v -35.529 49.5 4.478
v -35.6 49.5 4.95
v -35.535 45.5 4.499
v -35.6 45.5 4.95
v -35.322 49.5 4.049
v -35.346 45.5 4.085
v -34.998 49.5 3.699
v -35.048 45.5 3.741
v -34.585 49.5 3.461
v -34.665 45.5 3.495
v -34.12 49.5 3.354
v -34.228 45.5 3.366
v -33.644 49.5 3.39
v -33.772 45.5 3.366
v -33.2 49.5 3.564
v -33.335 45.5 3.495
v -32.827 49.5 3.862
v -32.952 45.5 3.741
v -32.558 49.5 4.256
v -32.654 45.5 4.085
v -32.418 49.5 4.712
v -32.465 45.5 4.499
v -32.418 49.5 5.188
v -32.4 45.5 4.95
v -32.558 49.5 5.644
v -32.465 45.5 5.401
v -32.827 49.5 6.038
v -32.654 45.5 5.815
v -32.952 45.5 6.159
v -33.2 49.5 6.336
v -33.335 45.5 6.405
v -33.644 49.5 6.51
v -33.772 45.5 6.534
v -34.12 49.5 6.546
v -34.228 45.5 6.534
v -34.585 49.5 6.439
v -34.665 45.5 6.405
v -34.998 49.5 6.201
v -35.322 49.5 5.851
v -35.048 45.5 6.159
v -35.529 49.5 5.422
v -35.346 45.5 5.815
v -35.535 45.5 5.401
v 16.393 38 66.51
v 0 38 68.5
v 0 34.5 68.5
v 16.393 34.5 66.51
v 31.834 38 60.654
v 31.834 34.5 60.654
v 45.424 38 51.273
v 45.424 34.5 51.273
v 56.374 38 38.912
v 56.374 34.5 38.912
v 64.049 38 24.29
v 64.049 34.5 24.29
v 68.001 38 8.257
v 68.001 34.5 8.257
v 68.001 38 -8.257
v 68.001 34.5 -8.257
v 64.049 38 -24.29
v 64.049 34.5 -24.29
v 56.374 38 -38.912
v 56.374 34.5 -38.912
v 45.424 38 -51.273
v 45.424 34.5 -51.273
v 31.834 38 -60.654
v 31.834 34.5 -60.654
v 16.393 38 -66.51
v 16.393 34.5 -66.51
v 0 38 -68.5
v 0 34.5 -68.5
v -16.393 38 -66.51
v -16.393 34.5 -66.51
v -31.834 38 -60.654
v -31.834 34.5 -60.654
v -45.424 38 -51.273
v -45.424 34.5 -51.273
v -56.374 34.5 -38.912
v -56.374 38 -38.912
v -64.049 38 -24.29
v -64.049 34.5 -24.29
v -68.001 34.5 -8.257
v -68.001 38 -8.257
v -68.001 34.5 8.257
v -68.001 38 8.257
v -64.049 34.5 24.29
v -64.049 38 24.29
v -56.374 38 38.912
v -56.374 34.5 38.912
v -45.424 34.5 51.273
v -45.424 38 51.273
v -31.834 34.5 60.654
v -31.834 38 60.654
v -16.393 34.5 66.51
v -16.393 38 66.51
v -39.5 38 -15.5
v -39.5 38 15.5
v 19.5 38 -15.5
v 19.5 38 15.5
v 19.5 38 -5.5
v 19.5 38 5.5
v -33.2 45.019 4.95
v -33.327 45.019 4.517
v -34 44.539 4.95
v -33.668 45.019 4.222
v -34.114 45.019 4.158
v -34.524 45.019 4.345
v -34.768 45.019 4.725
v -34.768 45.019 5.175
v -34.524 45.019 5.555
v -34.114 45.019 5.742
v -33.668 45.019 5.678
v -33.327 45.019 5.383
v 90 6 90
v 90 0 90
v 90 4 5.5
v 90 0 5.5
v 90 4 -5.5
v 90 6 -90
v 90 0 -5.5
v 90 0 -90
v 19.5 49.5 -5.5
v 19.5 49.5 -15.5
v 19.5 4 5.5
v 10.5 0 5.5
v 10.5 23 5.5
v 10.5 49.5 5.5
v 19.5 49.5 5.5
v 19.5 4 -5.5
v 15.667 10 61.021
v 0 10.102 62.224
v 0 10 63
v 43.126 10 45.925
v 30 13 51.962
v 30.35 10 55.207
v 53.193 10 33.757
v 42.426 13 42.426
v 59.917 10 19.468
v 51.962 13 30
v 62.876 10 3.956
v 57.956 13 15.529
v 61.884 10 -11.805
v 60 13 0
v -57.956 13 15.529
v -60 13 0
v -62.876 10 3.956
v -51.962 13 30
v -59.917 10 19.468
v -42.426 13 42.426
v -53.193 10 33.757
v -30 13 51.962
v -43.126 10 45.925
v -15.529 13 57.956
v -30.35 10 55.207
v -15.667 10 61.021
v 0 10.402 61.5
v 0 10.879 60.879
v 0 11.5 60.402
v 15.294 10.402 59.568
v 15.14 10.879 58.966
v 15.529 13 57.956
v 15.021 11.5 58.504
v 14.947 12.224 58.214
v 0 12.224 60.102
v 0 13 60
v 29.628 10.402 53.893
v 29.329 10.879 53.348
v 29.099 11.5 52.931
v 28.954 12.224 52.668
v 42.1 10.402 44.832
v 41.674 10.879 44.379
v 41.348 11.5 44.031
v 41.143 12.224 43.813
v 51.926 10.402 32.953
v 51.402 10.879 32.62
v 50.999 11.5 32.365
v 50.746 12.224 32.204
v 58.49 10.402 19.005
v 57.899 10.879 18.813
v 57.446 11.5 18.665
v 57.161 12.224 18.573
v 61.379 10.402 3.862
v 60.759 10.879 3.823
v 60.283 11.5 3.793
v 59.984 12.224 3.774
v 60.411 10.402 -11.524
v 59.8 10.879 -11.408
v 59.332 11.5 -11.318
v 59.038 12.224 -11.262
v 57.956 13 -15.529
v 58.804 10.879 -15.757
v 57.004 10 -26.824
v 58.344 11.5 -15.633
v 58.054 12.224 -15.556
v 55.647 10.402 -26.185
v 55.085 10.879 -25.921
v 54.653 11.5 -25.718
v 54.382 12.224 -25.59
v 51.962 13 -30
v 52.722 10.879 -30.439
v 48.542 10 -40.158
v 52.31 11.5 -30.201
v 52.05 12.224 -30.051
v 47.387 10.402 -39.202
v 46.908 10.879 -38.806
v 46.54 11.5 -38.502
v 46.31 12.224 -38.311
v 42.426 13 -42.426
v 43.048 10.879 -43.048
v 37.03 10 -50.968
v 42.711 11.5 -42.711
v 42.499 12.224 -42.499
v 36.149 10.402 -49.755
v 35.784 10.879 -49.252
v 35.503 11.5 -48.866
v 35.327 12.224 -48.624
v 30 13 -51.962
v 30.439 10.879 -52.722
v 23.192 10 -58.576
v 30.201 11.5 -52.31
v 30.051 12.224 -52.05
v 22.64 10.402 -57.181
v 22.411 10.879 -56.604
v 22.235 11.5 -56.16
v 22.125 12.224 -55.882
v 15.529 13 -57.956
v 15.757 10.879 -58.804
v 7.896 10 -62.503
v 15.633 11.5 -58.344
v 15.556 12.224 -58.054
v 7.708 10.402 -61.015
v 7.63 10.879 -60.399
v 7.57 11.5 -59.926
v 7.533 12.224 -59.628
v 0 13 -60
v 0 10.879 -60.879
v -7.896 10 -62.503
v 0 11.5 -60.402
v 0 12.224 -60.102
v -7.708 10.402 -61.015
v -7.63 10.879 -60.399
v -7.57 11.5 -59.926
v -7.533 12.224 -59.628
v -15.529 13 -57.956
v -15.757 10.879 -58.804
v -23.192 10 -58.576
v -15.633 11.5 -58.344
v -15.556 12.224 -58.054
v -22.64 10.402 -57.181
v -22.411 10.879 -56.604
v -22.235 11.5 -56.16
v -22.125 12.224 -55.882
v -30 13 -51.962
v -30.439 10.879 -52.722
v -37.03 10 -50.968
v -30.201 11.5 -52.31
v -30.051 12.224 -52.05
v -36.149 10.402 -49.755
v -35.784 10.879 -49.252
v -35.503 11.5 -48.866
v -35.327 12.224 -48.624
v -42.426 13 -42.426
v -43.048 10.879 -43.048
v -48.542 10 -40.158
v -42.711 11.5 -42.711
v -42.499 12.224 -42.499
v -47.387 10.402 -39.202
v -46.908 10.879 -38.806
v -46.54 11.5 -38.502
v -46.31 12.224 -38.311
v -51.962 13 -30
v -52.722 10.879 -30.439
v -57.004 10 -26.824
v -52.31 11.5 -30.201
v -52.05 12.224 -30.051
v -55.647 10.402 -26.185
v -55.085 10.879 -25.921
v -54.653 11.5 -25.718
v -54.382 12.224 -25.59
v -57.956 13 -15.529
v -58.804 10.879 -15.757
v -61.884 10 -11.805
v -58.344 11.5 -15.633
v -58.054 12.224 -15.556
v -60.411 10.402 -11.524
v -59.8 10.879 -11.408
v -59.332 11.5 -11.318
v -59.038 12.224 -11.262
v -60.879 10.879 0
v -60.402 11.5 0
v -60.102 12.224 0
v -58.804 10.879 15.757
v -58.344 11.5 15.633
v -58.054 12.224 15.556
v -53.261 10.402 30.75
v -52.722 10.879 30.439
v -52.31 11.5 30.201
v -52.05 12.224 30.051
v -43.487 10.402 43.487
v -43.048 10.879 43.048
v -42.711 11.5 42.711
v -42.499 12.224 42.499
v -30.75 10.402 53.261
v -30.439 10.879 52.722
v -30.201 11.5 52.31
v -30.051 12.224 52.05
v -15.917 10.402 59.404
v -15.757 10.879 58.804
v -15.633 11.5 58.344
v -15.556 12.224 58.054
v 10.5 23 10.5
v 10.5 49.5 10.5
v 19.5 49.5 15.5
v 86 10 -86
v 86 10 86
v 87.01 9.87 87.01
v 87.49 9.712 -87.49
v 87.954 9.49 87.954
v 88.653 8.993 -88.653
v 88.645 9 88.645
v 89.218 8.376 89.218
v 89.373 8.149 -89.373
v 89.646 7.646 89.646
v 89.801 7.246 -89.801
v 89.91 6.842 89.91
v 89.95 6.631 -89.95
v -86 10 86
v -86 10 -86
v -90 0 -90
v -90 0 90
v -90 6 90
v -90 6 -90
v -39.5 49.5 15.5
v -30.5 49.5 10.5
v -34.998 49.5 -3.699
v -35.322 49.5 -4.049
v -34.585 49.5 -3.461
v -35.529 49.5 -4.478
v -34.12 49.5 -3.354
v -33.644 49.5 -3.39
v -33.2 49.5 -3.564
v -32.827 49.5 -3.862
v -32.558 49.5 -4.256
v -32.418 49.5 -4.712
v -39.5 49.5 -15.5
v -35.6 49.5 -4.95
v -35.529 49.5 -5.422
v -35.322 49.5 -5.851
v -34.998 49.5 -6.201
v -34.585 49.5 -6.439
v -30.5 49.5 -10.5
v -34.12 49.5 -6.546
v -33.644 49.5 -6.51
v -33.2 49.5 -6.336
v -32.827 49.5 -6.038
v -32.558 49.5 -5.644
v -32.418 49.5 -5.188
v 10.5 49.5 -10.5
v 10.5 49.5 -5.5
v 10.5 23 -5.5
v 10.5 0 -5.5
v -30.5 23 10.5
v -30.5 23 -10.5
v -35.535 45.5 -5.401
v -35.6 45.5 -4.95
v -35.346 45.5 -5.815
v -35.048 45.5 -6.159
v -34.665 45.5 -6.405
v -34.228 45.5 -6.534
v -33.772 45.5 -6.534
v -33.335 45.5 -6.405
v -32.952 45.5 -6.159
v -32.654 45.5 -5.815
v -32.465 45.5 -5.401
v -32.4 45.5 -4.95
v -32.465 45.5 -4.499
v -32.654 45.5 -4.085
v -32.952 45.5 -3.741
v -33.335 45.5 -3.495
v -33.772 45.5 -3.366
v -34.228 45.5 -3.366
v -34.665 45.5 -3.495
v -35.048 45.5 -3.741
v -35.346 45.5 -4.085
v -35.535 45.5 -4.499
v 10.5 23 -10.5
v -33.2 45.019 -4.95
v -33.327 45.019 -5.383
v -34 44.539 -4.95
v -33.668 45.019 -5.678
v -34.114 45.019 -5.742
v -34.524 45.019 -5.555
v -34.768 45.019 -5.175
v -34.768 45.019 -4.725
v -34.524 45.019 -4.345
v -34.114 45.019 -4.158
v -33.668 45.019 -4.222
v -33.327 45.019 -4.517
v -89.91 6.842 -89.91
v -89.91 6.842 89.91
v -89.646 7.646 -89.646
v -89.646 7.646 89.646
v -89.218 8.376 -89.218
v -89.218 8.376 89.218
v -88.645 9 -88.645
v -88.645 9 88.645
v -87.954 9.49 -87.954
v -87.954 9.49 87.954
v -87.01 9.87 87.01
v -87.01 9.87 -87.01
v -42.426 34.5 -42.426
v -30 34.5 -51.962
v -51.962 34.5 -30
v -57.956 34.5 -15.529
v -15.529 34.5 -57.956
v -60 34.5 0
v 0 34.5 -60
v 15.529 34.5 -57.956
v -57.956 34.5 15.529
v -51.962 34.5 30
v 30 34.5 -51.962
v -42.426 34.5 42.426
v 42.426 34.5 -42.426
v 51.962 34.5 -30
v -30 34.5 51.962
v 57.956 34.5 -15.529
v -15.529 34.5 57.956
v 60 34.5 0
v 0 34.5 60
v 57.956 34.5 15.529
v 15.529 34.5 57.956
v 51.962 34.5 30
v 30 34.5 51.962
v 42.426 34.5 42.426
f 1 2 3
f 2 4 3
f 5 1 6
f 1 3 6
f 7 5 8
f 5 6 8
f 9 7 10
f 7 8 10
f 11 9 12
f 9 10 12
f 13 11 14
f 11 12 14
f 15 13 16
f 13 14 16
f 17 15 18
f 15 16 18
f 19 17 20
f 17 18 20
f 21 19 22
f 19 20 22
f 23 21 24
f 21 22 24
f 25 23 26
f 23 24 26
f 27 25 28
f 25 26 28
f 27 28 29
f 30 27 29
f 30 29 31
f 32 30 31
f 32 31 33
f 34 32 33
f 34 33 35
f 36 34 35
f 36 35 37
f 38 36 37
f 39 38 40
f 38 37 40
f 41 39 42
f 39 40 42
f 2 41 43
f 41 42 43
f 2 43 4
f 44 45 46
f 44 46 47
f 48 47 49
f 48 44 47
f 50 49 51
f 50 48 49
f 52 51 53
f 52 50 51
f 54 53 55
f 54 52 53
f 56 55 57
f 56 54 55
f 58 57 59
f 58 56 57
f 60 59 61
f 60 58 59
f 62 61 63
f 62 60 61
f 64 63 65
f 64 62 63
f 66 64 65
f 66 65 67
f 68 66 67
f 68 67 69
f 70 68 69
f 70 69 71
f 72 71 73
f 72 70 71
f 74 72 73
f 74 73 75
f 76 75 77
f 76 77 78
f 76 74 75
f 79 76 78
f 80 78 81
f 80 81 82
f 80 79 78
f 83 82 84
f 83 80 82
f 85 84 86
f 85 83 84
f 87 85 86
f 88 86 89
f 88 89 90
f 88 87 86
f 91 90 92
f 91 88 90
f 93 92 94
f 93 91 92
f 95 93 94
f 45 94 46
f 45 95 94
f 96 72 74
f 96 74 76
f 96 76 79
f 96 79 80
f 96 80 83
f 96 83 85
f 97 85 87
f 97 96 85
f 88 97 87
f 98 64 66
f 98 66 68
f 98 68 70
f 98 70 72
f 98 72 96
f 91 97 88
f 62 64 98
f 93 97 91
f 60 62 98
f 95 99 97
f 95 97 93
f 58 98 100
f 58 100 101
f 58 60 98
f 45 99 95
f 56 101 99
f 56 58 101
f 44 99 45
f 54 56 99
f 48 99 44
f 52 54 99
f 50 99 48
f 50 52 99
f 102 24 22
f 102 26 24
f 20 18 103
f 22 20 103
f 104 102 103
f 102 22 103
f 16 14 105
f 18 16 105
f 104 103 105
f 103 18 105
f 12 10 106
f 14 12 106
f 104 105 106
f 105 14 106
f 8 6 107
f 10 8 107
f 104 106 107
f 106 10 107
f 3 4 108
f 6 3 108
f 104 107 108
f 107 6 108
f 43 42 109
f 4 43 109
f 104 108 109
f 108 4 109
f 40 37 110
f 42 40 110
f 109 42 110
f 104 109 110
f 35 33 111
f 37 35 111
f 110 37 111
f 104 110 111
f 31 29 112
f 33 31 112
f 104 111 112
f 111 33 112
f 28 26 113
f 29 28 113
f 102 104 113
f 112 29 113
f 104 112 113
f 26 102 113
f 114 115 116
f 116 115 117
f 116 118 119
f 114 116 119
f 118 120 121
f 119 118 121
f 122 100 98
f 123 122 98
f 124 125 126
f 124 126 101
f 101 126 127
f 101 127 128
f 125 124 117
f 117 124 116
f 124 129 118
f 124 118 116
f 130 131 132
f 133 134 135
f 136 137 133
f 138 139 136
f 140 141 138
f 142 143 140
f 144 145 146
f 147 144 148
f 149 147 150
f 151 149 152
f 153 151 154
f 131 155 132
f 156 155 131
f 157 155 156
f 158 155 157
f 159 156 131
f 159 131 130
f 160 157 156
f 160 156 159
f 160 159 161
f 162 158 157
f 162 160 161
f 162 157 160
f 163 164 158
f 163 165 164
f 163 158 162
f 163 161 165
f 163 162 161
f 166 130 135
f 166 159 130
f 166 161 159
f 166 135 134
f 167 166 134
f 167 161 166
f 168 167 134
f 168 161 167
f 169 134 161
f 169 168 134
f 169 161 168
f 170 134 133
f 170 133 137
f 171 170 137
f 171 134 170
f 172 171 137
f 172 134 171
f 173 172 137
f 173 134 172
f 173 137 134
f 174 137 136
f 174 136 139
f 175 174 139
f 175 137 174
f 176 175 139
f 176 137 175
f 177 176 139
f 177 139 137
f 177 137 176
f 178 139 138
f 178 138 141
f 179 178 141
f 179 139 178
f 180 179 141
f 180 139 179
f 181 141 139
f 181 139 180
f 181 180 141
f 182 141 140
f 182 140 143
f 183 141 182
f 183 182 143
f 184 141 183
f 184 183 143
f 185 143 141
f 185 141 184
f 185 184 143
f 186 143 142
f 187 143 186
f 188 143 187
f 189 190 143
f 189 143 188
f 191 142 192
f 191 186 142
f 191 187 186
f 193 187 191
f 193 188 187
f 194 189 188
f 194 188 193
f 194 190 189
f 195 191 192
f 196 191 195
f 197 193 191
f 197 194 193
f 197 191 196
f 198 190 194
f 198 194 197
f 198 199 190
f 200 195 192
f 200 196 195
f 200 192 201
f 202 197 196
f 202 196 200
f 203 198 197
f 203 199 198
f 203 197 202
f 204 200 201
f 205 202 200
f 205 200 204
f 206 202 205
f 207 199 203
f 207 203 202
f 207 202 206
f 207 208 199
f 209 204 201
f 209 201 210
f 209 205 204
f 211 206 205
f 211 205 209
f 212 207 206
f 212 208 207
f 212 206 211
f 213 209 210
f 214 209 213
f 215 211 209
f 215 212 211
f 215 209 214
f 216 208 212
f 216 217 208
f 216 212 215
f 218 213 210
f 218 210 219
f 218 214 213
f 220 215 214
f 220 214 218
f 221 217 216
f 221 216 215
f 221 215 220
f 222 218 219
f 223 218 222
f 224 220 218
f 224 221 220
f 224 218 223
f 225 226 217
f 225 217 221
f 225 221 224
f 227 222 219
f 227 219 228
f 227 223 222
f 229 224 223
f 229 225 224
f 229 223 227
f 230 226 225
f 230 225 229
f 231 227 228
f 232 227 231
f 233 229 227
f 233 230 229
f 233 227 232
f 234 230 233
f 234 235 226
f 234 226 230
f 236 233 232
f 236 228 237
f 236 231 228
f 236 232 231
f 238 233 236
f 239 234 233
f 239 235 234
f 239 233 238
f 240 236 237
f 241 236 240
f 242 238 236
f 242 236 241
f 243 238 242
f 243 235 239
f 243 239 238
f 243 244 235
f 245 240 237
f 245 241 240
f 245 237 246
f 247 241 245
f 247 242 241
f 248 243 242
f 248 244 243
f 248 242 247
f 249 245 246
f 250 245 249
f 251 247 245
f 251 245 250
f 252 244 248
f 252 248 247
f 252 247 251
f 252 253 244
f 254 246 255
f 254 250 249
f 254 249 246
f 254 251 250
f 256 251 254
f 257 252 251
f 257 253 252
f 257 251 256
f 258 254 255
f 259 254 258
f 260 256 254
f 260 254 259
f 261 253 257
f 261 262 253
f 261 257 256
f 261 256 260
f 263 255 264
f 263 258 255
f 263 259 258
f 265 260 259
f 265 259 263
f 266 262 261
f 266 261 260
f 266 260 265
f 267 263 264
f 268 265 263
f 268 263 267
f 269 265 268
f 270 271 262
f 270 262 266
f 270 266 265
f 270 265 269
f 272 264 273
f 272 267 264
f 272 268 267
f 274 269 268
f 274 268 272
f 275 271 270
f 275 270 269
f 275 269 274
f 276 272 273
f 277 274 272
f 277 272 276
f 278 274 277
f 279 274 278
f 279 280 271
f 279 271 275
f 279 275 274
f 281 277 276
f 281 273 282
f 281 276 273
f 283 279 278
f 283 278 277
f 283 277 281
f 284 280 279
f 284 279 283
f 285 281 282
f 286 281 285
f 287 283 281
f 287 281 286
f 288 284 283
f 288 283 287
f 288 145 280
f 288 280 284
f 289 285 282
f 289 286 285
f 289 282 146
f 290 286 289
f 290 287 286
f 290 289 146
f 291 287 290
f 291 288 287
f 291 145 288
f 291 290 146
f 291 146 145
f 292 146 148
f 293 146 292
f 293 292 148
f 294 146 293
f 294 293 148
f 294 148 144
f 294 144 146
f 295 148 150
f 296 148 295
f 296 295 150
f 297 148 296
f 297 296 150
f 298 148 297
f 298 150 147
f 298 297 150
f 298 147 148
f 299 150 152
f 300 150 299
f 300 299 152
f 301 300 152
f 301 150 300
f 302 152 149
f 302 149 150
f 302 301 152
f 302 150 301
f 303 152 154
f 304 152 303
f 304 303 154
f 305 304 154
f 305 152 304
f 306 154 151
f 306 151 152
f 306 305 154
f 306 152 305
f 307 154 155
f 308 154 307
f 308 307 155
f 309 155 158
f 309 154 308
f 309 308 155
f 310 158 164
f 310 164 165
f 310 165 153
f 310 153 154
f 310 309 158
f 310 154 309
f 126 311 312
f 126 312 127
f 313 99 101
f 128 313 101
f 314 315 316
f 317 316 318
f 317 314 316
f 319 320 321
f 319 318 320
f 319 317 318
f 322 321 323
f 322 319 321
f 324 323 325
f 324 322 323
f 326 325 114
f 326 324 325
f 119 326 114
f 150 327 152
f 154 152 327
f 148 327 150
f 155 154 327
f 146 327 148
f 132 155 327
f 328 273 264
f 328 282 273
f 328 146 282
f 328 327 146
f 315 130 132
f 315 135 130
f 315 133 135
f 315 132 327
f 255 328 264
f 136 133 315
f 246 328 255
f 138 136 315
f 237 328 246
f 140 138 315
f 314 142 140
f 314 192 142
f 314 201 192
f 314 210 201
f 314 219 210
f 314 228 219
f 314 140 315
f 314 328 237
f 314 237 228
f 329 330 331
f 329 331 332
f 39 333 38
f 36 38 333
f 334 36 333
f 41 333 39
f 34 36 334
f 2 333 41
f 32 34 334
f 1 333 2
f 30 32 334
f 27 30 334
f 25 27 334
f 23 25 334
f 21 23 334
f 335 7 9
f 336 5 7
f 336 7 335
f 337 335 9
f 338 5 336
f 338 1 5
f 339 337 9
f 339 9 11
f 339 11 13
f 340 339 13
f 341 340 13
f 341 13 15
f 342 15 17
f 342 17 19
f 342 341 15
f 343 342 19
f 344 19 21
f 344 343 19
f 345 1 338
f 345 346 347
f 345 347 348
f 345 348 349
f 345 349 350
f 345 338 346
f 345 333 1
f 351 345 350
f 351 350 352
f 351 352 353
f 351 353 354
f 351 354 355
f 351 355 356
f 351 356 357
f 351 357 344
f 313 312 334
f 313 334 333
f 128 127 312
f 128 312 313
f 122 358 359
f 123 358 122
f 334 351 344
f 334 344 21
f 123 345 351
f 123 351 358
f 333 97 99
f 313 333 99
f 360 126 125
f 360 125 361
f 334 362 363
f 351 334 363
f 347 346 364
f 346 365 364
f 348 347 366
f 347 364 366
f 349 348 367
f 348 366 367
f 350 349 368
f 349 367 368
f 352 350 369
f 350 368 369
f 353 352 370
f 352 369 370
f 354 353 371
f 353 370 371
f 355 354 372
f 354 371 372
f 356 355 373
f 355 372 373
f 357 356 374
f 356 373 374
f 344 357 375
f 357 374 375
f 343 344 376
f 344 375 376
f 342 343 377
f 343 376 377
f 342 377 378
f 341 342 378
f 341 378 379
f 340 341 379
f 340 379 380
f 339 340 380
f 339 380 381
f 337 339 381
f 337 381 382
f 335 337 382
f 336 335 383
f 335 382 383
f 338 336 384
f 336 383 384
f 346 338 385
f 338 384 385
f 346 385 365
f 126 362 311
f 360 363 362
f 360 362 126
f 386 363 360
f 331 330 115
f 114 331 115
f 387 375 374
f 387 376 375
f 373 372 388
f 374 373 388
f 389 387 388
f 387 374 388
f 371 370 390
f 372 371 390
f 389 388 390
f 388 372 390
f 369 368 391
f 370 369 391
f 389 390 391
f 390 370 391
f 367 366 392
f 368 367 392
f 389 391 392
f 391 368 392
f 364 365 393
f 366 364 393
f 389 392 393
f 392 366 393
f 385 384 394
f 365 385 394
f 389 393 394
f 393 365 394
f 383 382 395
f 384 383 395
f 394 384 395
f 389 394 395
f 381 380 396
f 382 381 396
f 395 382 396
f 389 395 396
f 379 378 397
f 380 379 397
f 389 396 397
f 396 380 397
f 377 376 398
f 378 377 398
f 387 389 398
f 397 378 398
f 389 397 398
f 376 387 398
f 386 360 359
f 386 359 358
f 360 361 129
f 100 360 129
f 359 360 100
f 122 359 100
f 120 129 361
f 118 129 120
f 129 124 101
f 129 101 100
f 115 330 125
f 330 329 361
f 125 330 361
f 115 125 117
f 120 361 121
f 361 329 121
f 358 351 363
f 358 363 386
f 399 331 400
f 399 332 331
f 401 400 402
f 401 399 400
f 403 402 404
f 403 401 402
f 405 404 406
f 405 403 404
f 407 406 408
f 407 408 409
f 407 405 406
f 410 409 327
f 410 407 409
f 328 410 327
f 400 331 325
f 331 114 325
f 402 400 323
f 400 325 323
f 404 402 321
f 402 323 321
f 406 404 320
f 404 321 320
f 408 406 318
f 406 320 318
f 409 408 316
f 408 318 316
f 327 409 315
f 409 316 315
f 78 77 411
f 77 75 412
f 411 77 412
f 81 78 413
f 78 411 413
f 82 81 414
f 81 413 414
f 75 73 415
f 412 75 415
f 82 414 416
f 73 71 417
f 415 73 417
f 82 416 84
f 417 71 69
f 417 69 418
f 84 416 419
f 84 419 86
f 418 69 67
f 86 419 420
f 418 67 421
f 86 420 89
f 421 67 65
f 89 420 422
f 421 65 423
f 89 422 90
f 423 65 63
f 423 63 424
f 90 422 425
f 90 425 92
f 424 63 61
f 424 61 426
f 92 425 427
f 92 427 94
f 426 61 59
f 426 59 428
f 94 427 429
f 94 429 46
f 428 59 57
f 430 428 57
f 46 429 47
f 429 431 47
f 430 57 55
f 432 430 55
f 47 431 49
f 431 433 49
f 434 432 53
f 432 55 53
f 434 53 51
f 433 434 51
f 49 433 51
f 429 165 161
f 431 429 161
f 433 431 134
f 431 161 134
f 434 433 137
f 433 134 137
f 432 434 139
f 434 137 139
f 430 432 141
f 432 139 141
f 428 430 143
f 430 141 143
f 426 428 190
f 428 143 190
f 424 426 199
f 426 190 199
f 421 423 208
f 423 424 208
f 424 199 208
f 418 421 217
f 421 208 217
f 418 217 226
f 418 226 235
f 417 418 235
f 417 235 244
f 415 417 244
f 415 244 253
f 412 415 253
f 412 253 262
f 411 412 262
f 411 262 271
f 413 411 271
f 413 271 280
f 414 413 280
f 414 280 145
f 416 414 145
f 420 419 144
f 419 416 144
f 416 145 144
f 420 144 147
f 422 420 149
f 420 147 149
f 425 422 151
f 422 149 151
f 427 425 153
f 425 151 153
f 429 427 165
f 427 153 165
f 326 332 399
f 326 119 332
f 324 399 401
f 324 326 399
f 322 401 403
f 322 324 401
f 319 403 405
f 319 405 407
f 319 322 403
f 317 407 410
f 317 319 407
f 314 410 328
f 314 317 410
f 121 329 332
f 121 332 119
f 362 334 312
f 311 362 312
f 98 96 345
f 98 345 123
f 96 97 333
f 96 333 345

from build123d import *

# Parameters (mm, degrees)
ESQUISSE1_W             = 180
ESQUISSE1_H             = 180
CARR_DEPTH              = 10
ESQUISSE2_R             = 60
ROND_DEPTH              = 28
CONG_2_R                = 4
CONG_8_R                = 3
ESQUISSE27_R            = 68.5
BOSS_EXTRU_2_DEPTH      = 3.5
ESQUISSE20_W            = 41
ESQUISSE20_H            = 21
ENL_V_MAT_EXTRU_1_DEPTH = 15
ESQUISSE21_W            = 59
ESQUISSE21_H            = 31
ESQUISSE21_W_2          = 41
ESQUISSE21_H_2          = 21
BOSS_EXTRU_1_DEPTH      = 26.5
D_GAGEMENT_M31_D        = 3.2
D_GAGEMENT_M31_DEPTH    = 4
D_GAGEMENT_M31_TIP      = 0.96137699
ENL_V_MAT_EXTRU_2_REACH = 138.566
ESQUISSE25_W            = 9
ESQUISSE25_H            = 11
ESQUISSE26_W            = 11
ESQUISSE26_H            = 4
ENL_V_MAT_EXTRU_3_DEPTH = 151.134939305


with BuildPart() as part:
    # Esquisse1 → Carré (new body)
    with BuildSketch(Plane(origin=(0, 0, 0), x_dir=(1, 0, 0), z_dir=(0, 1, 0))):
        Rectangle(ESQUISSE1_W, ESQUISSE1_H)
    extrude(amount=CARR_DEPTH)

    # Esquisse2 → Rond (add)
    with BuildSketch(Plane(origin=(0, 10, 0), x_dir=(1, 0, 0), z_dir=(0, 1, 0))):
        with Locations(Location((0, 0, 0), (0, 0, 270))):
            Circle(ESQUISSE2_R)
    extrude(amount=ROND_DEPTH)

    # Congé2
    cong_2_edges = [part.edges().sort_by_distance(p)[0] for p in [
        (-90, 10, 0),
        (0, 10, 90),
        (90, 10, 0),
        (0, 10, -90),
    ]]
    fillet(cong_2_edges, radius=CONG_2_R)

    # Congé8
    cong_8_edges = [part.edges().sort_by_distance(p)[0] for p in [
        (0, 10, -60),
    ]]
    fillet(cong_8_edges, radius=CONG_8_R)

    # Esquisse27 → Boss.-Extru.2 (add)
    with BuildSketch(Plane(origin=(0, 38, 0), x_dir=(1, 0, 0), z_dir=(0, 1, 0))):
        with Locations(Location((0, 0, 0), (0, 0, 270))):
            Circle(ESQUISSE27_R)
    extrude(amount=-BOSS_EXTRU_2_DEPTH)

    # Esquisse20 → Enlèv. mat.-Extru.1 (cut)
    with BuildSketch(Plane(origin=(0, 38, 0), x_dir=(1, 0, 0), z_dir=(0, 1, 0))):
        with Locations((-10, 0)):
            Rectangle(ESQUISSE20_W, ESQUISSE20_H)
    extrude(amount=-ENL_V_MAT_EXTRU_1_DEPTH, mode=Mode.SUBTRACT)

    # Esquisse21 → Boss.-Extru.1 (add)
    with BuildSketch(Plane(origin=(0, 23, 0), x_dir=(1, 0, 0), z_dir=(0, 1, 0))):
        with Locations((-10, 0)):
            Rectangle(ESQUISSE21_W, ESQUISSE21_H)
        with Locations((-10, 0)):
            Rectangle(ESQUISSE21_W_2, ESQUISSE21_H_2, mode=Mode.SUBTRACT)
    extrude(amount=BOSS_EXTRU_1_DEPTH)

    # Dégagement M31
    with Locations(Plane(origin=(0, 49.5, 0), x_dir=(1, 0, 0), z_dir=(0, 1, 0))):
        with Locations((-34, 4.95), (-34, -4.95)):
            Hole(D_GAGEMENT_M31_D / 2, depth=D_GAGEMENT_M31_DEPTH)
            with Locations((0, 0, -(D_GAGEMENT_M31_DEPTH + D_GAGEMENT_M31_TIP / 2))):  # 118° drill point
                Cone(0, D_GAGEMENT_M31_D / 2, D_GAGEMENT_M31_TIP, mode=Mode.SUBTRACT)

    # Enlèv. mat.-Extru.2: up to this face of the body (flat: up to its plane)
    enl_v_mat_extru_2_end = Plane(part.part.faces().sort_by_distance((0, 0, 0))[0])
    # Esquisse25 → Enlèv. mat.-Extru.2 (cut, up to the picked face)
    with BuildSketch(Plane(origin=(0, 49.5, 0), x_dir=(1, 0, 0), z_dir=(0, 1, 0)), mode=Mode.PRIVATE) as enl_v_mat_extru_2_sk1:
        with Locations((15, 0)):
            Rectangle(ESQUISSE25_W, ESQUISSE25_H)
    enl_v_mat_extru_2_tool1 = split(extrude(enl_v_mat_extru_2_sk1.sketch, amount=-ENL_V_MAT_EXTRU_2_REACH, mode=Mode.PRIVATE), bisect_by=enl_v_mat_extru_2_end, keep=Keep.BOTH, mode=Mode.PRIVATE)
    add(enl_v_mat_extru_2_tool1.solids().sort_by(Axis((15, 49.5, 0), (0, -1, 0)))[0], mode=Mode.SUBTRACT)

    # Esquisse26 → Enlèv. mat.-Extru.3 (cut, through all)
    with BuildSketch(Plane.ZY.offset(-19.5)):
        with Locations((0, 2)):
            Rectangle(ESQUISSE26_W, ESQUISSE26_H)
    extrude(amount=-ENL_V_MAT_EXTRU_3_DEPTH, mode=Mode.SUBTRACT)


solid = part.part
